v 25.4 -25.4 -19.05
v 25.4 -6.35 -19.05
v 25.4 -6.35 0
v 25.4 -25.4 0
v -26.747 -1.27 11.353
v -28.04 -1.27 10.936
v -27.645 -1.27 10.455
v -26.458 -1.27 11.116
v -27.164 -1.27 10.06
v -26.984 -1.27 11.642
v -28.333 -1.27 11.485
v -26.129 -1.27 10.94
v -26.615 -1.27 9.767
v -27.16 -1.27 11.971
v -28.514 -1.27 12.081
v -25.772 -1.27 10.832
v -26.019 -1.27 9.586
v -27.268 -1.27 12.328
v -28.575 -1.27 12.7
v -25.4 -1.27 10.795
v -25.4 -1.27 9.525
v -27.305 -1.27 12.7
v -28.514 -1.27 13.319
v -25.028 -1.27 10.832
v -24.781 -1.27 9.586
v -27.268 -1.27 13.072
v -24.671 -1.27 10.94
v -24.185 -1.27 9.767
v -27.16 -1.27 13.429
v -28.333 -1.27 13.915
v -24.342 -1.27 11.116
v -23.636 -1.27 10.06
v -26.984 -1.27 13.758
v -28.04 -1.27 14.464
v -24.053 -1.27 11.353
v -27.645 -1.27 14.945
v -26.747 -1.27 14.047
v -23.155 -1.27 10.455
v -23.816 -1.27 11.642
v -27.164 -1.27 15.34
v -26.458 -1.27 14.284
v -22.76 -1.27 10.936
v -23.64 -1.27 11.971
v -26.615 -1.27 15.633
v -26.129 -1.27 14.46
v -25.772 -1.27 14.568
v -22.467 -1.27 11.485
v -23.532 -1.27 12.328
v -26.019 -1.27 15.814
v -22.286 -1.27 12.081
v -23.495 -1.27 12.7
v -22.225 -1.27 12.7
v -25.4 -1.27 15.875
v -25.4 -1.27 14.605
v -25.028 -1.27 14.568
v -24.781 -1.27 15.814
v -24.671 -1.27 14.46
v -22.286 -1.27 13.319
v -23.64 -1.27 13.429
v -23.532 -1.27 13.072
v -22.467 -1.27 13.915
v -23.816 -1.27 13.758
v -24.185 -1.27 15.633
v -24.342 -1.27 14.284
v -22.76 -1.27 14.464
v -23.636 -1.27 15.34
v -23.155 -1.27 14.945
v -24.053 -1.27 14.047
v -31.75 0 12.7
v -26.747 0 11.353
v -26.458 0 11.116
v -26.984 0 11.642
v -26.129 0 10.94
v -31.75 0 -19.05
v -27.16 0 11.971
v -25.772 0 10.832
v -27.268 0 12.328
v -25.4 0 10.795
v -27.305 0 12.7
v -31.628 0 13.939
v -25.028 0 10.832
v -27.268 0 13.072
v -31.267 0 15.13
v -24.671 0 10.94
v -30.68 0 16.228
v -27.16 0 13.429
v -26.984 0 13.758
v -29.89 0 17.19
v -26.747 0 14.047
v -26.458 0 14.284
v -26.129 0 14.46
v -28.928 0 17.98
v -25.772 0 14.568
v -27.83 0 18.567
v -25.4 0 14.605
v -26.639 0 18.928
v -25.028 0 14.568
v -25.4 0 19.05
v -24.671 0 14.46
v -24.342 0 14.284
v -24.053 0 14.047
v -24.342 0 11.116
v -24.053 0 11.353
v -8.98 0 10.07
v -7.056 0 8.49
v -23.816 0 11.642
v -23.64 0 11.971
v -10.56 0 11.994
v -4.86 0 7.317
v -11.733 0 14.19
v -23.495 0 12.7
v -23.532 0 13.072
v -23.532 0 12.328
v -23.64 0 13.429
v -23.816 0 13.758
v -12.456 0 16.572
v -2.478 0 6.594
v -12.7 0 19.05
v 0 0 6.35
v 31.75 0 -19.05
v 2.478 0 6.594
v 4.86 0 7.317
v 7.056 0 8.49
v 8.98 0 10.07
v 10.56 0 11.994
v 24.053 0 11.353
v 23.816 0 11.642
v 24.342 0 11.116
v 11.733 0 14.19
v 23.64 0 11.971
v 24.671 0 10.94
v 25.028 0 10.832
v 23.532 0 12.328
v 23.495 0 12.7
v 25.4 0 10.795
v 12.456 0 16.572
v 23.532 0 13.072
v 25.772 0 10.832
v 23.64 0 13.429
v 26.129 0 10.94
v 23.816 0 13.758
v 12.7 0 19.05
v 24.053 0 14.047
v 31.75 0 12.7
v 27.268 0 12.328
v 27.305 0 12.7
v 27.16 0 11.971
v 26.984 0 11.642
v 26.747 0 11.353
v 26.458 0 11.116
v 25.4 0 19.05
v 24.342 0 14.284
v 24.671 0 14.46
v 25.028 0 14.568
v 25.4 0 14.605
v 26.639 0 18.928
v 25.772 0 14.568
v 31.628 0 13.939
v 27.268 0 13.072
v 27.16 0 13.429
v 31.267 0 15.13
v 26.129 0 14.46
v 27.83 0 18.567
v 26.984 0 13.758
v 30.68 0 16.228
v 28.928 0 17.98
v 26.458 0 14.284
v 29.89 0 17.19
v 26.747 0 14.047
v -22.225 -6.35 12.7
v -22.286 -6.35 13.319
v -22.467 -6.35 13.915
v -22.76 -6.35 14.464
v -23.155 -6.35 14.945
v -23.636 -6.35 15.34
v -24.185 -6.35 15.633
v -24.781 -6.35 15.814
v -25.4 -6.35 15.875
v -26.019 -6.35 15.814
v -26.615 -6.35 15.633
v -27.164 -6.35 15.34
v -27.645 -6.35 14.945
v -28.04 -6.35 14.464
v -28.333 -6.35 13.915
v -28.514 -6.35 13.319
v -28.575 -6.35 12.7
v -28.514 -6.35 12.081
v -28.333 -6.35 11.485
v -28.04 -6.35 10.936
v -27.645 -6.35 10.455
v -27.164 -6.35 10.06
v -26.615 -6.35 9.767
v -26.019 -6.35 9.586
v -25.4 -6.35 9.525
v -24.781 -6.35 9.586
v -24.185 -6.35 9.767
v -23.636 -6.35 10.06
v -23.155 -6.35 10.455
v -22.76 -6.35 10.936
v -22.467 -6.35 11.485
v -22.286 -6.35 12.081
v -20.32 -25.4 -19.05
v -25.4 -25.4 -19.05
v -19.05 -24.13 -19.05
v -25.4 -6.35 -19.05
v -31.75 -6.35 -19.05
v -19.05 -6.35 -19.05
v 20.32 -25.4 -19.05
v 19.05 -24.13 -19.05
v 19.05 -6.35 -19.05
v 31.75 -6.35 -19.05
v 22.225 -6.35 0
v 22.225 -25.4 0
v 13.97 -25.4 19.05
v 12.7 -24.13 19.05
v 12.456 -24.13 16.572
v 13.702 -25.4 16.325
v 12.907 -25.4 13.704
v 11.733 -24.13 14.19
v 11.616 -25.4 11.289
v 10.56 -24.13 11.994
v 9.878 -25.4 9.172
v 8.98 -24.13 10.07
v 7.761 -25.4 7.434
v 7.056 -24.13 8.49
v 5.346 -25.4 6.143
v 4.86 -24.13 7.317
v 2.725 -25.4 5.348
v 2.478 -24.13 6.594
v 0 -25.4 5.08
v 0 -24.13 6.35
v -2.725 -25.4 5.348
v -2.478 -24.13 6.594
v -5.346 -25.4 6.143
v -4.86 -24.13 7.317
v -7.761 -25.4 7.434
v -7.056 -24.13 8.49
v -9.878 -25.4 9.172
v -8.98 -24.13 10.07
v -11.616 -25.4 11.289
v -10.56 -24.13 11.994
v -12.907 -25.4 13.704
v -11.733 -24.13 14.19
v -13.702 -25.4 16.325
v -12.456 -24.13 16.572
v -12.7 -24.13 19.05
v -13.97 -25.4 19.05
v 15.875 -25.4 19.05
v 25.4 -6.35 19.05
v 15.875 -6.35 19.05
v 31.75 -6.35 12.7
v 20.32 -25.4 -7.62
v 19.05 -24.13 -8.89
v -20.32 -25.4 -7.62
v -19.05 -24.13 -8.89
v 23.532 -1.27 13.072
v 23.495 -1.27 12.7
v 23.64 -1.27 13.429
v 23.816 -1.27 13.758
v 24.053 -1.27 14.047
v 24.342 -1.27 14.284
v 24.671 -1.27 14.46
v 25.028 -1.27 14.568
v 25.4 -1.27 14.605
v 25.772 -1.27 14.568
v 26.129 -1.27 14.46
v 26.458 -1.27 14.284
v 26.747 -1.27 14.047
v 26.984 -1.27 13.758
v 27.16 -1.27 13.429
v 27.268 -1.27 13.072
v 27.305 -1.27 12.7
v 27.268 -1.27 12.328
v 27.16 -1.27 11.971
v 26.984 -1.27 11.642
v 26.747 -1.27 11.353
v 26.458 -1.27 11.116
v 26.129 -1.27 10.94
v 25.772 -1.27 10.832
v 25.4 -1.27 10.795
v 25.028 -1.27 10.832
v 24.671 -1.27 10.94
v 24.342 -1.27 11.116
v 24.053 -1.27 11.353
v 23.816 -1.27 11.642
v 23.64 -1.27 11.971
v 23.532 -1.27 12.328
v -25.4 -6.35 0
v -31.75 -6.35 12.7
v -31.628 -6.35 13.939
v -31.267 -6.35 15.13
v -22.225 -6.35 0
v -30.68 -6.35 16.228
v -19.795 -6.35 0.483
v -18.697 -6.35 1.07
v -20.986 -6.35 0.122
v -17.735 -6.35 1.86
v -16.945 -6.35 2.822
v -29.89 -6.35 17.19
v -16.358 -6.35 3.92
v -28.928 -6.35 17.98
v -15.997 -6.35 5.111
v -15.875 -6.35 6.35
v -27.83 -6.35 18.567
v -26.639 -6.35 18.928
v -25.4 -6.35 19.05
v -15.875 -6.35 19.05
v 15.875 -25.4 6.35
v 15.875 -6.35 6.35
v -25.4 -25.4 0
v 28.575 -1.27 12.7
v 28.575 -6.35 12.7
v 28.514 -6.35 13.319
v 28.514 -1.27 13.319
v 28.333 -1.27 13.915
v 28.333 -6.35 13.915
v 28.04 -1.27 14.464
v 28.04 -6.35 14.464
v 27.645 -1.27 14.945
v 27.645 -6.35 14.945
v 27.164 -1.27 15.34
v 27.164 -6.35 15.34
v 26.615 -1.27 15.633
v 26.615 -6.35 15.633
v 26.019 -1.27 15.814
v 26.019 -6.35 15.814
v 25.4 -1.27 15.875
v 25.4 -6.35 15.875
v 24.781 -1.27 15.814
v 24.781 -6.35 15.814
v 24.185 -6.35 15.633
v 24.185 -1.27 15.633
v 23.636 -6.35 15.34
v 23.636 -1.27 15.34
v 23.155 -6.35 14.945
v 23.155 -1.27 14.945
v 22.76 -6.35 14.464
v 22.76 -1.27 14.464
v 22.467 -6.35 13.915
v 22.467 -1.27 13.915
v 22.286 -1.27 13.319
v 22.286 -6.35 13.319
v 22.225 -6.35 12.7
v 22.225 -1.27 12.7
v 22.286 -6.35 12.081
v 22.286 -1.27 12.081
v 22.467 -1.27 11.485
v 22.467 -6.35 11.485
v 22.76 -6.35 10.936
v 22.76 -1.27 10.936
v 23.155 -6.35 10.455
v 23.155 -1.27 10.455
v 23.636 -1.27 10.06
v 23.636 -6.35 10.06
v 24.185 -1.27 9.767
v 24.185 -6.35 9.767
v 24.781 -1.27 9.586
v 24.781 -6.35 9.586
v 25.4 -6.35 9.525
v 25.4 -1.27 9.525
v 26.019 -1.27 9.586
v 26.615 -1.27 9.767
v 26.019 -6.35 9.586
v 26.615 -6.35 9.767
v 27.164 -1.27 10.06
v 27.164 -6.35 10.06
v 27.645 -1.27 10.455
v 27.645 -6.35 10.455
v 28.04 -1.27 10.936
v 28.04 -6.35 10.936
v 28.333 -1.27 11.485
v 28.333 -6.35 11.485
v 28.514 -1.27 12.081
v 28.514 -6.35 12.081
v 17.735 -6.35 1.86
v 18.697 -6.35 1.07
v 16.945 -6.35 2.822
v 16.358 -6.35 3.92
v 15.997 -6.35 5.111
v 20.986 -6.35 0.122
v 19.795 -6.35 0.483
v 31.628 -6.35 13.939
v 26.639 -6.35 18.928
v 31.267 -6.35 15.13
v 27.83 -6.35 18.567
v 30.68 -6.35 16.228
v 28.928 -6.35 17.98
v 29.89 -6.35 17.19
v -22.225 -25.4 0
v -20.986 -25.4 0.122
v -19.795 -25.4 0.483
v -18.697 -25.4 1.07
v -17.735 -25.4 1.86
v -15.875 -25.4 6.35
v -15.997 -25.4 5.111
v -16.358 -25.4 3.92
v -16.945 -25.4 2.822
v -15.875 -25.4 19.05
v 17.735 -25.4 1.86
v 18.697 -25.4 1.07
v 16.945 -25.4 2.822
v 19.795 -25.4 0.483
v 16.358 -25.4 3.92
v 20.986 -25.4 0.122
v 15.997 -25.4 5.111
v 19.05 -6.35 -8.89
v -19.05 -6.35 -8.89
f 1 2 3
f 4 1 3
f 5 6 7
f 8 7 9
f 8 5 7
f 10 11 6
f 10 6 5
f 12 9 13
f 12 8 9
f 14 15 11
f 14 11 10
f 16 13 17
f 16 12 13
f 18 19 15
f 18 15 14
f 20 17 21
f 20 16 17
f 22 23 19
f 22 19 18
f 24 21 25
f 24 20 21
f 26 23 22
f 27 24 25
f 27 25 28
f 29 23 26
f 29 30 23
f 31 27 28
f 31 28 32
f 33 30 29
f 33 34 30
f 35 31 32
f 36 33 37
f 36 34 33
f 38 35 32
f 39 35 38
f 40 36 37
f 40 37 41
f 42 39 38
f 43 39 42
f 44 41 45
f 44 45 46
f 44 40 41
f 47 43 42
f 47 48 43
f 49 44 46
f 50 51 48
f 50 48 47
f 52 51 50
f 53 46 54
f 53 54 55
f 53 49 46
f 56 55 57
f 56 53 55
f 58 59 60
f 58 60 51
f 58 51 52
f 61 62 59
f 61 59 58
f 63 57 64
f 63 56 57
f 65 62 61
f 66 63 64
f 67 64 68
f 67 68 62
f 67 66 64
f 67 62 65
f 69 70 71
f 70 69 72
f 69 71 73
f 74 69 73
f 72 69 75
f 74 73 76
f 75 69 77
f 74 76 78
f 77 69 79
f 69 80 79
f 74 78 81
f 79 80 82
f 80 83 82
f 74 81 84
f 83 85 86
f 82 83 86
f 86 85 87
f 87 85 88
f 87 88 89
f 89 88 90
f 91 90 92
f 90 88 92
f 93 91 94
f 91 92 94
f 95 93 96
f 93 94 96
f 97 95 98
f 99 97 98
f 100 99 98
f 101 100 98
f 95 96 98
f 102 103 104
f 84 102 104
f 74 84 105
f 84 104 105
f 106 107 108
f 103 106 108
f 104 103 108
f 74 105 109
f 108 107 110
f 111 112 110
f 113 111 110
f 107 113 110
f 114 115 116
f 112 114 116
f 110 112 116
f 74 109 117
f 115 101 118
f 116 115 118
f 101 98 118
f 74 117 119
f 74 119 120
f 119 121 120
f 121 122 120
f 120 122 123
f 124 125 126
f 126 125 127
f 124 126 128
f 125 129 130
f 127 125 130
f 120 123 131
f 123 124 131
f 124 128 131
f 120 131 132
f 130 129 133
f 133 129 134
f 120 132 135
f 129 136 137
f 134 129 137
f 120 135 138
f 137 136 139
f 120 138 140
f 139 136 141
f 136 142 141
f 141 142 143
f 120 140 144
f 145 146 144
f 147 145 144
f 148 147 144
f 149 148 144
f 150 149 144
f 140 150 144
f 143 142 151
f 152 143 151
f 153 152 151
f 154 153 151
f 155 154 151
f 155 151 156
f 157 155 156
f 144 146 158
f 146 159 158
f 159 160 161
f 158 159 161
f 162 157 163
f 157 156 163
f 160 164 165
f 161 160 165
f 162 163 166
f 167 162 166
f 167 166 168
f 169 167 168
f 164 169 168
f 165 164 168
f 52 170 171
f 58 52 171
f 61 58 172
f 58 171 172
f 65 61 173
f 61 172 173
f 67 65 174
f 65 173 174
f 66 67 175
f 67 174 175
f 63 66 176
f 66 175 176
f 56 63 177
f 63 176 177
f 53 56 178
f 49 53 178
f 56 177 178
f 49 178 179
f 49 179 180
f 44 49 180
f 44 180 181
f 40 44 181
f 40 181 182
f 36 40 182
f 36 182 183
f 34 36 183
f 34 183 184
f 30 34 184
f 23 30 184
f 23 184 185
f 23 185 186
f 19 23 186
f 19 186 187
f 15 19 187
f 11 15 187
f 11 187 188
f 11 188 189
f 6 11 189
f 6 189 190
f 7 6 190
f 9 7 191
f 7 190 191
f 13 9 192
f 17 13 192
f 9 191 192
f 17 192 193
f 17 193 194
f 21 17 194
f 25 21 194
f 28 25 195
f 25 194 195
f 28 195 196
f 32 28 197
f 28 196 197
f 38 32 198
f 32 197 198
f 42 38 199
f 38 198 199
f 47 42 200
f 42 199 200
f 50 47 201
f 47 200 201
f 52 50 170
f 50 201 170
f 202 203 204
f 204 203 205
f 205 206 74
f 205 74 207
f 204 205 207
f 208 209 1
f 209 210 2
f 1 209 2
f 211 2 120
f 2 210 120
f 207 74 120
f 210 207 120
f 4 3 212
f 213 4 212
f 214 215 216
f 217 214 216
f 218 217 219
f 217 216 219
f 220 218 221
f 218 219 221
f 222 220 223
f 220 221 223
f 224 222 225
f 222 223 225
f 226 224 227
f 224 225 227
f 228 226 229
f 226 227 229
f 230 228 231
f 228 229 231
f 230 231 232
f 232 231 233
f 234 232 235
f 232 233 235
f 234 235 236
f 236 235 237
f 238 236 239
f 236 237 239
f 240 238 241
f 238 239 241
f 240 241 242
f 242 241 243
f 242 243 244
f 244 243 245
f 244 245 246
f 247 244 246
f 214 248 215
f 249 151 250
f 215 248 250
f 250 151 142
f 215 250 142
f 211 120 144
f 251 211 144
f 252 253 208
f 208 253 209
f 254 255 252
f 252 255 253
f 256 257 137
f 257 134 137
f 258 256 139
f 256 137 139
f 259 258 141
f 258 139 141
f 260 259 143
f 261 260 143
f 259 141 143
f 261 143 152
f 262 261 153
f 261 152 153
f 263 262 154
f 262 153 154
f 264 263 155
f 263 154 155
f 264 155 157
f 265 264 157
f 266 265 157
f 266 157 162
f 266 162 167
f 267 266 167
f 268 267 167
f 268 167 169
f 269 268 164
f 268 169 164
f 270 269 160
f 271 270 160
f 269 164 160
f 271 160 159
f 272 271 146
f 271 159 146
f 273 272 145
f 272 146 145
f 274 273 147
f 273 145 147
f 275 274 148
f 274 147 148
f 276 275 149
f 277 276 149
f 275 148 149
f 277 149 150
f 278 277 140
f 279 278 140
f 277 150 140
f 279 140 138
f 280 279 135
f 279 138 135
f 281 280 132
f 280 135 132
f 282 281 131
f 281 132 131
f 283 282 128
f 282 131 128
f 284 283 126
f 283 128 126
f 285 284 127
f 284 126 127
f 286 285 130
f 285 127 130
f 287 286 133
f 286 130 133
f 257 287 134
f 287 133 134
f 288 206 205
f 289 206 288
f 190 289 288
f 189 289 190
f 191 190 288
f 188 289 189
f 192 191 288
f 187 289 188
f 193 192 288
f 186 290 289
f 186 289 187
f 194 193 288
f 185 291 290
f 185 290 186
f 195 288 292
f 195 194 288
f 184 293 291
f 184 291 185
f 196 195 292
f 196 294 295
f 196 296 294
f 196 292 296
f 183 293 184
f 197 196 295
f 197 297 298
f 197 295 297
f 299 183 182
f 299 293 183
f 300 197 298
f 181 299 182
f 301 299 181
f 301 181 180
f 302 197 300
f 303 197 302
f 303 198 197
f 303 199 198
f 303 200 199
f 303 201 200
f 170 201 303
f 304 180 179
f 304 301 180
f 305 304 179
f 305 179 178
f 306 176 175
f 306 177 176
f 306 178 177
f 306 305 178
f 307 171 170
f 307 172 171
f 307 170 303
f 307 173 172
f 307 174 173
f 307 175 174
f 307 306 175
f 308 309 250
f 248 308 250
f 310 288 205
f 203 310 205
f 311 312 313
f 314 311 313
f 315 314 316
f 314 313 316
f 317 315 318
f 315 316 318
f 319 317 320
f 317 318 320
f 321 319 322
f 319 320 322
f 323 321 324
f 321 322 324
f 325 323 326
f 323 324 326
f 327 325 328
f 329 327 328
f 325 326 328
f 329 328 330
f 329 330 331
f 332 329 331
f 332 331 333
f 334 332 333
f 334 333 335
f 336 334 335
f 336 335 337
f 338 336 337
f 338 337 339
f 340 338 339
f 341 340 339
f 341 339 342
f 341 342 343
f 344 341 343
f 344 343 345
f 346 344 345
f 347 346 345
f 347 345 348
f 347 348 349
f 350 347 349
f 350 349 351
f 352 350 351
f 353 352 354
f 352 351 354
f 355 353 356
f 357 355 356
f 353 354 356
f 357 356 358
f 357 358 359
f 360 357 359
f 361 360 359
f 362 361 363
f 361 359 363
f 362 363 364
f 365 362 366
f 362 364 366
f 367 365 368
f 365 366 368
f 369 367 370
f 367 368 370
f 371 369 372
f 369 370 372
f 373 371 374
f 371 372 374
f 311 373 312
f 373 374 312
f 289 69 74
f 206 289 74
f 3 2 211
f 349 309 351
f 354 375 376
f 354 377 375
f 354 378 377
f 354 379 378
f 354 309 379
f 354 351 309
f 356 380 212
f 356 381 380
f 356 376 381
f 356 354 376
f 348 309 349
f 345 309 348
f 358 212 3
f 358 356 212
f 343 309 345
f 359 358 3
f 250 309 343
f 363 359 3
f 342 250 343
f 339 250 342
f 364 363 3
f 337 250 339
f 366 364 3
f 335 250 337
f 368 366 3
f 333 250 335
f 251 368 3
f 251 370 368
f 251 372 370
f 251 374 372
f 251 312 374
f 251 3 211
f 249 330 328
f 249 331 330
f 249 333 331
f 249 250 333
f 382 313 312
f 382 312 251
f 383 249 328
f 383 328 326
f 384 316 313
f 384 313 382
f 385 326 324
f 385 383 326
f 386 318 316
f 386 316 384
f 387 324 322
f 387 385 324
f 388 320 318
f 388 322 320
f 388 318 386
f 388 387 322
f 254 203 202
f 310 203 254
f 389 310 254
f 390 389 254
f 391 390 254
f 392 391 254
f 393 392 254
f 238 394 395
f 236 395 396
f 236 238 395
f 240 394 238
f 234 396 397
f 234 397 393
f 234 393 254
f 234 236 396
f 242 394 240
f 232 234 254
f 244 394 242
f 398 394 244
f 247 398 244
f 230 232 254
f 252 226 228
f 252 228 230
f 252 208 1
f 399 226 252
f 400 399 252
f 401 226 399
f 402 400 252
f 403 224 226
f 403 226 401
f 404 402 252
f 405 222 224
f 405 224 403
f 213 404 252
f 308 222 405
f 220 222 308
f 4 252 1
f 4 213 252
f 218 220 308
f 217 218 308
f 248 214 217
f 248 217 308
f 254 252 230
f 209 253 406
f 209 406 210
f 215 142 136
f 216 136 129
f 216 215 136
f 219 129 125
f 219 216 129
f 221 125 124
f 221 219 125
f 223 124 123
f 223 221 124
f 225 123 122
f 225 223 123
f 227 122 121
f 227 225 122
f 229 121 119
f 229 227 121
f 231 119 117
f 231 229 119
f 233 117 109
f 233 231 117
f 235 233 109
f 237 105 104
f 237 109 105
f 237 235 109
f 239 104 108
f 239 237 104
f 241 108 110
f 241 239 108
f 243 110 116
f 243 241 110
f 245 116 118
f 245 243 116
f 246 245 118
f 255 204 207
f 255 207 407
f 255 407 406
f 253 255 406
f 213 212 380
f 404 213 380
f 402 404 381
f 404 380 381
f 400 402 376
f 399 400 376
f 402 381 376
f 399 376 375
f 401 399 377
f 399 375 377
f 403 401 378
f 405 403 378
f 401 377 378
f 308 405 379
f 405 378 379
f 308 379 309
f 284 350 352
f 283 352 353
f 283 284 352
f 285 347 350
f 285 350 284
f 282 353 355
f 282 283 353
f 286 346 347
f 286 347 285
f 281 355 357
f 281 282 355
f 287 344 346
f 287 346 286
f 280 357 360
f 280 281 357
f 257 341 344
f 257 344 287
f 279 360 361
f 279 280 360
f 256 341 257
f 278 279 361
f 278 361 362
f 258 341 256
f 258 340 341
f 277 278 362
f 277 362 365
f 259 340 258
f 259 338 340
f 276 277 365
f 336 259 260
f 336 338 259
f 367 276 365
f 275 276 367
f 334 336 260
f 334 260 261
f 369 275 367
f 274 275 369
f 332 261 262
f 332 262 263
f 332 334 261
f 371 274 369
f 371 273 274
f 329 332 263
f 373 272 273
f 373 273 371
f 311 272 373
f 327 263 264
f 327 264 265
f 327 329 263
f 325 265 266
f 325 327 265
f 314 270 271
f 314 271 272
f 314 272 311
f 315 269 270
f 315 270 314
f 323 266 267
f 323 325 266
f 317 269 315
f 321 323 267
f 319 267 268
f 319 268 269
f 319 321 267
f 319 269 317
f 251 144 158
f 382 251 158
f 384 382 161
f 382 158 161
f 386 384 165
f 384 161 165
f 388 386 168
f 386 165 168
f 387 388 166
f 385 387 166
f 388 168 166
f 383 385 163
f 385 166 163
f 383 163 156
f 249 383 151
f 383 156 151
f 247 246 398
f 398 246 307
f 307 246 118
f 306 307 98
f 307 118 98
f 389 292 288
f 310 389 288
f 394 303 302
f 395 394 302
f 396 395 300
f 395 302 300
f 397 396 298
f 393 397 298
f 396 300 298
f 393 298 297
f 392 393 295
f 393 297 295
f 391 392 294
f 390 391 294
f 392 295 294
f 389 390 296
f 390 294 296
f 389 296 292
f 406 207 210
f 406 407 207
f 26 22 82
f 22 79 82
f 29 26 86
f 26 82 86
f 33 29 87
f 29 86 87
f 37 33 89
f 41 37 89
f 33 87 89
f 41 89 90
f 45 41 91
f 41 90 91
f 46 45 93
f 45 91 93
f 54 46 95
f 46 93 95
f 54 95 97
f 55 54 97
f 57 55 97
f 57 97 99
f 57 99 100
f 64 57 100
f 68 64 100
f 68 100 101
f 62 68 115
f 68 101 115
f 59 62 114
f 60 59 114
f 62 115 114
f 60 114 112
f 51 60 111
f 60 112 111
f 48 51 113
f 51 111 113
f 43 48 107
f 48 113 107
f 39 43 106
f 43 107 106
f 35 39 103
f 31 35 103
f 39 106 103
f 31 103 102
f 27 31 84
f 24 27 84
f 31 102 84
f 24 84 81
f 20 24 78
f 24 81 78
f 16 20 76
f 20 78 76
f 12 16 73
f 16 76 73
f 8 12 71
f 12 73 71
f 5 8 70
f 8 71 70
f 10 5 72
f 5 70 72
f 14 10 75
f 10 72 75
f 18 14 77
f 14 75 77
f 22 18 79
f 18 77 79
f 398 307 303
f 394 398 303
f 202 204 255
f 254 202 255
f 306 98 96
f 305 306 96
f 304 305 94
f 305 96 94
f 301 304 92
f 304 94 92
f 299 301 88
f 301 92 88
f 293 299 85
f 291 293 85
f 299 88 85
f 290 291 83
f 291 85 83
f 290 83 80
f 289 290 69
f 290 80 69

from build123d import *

# Parameters (mm, degrees)
F1_DEPTH             = 6.35
F3_DEPTH             = 19.05
F4_DEPTH             = 6.351
F5_SIZE              = 1.27
F6_SIZE              = 1.27
F9_D                 = 3.81
F9_CBORE_D           = 6.35
F9_CBORE_DEPTH       = 5.08
F9_ON_F8_D           = 3.81
F9_ON_F8_CBORE_D     = 6.35
F9_ON_F8_CBORE_DEPTH = 5.08


with BuildPart() as f1:
    # F0 (on Front) → F1 (new body)
    with BuildSketch(Plane.XZ):
        with BuildLine():
            ThreePointArc((31.75, 12.7), (29.8901280605, 17.1901280605), (25.4, 19.05))
            Line((25.4, 19.05), (-25.4, 19.05))
            ThreePointArc((-25.4, 19.05), (-29.8901280605, 17.1901280605), (-31.75, 12.7))
            Line((-31.75, 12.7), (-31.75, -19.05))
            Line((-31.75, -19.05), (31.75, -19.05))
            Line((31.75, -19.05), (31.75, 12.7))
        make_face()
    extrude(amount=F1_DEPTH)

    # F2 (on face) → F3 (join)
    with BuildSketch(Plane.XZ.offset(6.35)):
        with BuildLine():
            Line((19.05, -19.05), (25.4, -19.05))
            Line((25.4, -19.05), (25.4, 0))
            Line((25.4, 0), (22.225, 0))
            ThreePointArc((22.225, 0), (17.7348719395, 1.8598719395), (15.875, 6.35))
            Line((15.875, 6.35), (15.875, 19.05))
            Line((15.875, 19.05), (12.7, 19.05))
            ThreePointArc((12.7, 19.05), (0, 6.35), (-12.7, 19.05))
            Line((-12.7, 19.05), (-15.875, 19.05))
            Line((-15.875, 19.05), (-15.875, 6.35))
            ThreePointArc((-15.875, 6.35), (-17.7348719395, 1.8598719395), (-22.225, 0))
            Line((-22.225, 0), (-25.4, 0))
            Line((-25.4, 0), (-25.4, -19.05))
            Line((-25.4, -19.05), (-19.05, -19.05))
            Line((-19.05, -19.05), (-19.05, -8.89))
            Line((-19.05, -8.89), (19.05, -8.89))
            Line((19.05, -8.89), (19.05, -19.05))
        make_face()
    extrude(amount=F3_DEPTH)

    # F4 (cut, through all): a face of the model
    f4_faces = [f1.faces().sort_by_distance(p)[0] for p in [
        (0, -6.35, 13.659952594),
    ]]
    extrude(f4_faces, amount=-F4_DEPTH, mode=Mode.SUBTRACT)

    # F5
    f5_edges = [f1.edges().sort_by_distance(p)[0] for p in [
        (0, -25.4, -8.89),
        (-19.05, -25.4, -13.97),
        (19.05, -25.4, -13.97),
    ]]
    chamfer(f5_edges, length=F5_SIZE)

    # F6
    f6_edges = [f1.edges().sort_by_distance(p)[0] for p in [
        (0, -25.4, 6.35),
    ]]
    chamfer(f6_edges, length=F6_SIZE)

    # F9 (through all)
    with Locations(Plane.XZ.offset(6.35)):
        with Locations((-25.4, 12.7)):
            CounterBoreHole(F9_D / 2, F9_CBORE_D / 2, F9_CBORE_DEPTH)

    # F9 on F8 (through all)
    with Locations(Plane.XZ.offset(6.35)):
        with Locations((25.4, 12.7)):
            CounterBoreHole(F9_ON_F8_D / 2, F9_ON_F8_CBORE_D / 2, F9_ON_F8_CBORE_DEPTH)


solid = f1.part
